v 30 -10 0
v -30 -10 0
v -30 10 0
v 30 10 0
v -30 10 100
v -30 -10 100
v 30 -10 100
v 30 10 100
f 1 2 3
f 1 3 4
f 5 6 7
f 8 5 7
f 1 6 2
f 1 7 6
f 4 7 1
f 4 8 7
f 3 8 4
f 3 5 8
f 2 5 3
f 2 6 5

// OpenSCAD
$fn = 64;

length = 100;
w = 60;
h = 20;

module extrusion_2060(len=100, w=60, h=20) {
    linear_extrude(height=len, center=false, convexity=10)
        square([w, h], center=true);
}

extrusion_2060(length, w, h);
